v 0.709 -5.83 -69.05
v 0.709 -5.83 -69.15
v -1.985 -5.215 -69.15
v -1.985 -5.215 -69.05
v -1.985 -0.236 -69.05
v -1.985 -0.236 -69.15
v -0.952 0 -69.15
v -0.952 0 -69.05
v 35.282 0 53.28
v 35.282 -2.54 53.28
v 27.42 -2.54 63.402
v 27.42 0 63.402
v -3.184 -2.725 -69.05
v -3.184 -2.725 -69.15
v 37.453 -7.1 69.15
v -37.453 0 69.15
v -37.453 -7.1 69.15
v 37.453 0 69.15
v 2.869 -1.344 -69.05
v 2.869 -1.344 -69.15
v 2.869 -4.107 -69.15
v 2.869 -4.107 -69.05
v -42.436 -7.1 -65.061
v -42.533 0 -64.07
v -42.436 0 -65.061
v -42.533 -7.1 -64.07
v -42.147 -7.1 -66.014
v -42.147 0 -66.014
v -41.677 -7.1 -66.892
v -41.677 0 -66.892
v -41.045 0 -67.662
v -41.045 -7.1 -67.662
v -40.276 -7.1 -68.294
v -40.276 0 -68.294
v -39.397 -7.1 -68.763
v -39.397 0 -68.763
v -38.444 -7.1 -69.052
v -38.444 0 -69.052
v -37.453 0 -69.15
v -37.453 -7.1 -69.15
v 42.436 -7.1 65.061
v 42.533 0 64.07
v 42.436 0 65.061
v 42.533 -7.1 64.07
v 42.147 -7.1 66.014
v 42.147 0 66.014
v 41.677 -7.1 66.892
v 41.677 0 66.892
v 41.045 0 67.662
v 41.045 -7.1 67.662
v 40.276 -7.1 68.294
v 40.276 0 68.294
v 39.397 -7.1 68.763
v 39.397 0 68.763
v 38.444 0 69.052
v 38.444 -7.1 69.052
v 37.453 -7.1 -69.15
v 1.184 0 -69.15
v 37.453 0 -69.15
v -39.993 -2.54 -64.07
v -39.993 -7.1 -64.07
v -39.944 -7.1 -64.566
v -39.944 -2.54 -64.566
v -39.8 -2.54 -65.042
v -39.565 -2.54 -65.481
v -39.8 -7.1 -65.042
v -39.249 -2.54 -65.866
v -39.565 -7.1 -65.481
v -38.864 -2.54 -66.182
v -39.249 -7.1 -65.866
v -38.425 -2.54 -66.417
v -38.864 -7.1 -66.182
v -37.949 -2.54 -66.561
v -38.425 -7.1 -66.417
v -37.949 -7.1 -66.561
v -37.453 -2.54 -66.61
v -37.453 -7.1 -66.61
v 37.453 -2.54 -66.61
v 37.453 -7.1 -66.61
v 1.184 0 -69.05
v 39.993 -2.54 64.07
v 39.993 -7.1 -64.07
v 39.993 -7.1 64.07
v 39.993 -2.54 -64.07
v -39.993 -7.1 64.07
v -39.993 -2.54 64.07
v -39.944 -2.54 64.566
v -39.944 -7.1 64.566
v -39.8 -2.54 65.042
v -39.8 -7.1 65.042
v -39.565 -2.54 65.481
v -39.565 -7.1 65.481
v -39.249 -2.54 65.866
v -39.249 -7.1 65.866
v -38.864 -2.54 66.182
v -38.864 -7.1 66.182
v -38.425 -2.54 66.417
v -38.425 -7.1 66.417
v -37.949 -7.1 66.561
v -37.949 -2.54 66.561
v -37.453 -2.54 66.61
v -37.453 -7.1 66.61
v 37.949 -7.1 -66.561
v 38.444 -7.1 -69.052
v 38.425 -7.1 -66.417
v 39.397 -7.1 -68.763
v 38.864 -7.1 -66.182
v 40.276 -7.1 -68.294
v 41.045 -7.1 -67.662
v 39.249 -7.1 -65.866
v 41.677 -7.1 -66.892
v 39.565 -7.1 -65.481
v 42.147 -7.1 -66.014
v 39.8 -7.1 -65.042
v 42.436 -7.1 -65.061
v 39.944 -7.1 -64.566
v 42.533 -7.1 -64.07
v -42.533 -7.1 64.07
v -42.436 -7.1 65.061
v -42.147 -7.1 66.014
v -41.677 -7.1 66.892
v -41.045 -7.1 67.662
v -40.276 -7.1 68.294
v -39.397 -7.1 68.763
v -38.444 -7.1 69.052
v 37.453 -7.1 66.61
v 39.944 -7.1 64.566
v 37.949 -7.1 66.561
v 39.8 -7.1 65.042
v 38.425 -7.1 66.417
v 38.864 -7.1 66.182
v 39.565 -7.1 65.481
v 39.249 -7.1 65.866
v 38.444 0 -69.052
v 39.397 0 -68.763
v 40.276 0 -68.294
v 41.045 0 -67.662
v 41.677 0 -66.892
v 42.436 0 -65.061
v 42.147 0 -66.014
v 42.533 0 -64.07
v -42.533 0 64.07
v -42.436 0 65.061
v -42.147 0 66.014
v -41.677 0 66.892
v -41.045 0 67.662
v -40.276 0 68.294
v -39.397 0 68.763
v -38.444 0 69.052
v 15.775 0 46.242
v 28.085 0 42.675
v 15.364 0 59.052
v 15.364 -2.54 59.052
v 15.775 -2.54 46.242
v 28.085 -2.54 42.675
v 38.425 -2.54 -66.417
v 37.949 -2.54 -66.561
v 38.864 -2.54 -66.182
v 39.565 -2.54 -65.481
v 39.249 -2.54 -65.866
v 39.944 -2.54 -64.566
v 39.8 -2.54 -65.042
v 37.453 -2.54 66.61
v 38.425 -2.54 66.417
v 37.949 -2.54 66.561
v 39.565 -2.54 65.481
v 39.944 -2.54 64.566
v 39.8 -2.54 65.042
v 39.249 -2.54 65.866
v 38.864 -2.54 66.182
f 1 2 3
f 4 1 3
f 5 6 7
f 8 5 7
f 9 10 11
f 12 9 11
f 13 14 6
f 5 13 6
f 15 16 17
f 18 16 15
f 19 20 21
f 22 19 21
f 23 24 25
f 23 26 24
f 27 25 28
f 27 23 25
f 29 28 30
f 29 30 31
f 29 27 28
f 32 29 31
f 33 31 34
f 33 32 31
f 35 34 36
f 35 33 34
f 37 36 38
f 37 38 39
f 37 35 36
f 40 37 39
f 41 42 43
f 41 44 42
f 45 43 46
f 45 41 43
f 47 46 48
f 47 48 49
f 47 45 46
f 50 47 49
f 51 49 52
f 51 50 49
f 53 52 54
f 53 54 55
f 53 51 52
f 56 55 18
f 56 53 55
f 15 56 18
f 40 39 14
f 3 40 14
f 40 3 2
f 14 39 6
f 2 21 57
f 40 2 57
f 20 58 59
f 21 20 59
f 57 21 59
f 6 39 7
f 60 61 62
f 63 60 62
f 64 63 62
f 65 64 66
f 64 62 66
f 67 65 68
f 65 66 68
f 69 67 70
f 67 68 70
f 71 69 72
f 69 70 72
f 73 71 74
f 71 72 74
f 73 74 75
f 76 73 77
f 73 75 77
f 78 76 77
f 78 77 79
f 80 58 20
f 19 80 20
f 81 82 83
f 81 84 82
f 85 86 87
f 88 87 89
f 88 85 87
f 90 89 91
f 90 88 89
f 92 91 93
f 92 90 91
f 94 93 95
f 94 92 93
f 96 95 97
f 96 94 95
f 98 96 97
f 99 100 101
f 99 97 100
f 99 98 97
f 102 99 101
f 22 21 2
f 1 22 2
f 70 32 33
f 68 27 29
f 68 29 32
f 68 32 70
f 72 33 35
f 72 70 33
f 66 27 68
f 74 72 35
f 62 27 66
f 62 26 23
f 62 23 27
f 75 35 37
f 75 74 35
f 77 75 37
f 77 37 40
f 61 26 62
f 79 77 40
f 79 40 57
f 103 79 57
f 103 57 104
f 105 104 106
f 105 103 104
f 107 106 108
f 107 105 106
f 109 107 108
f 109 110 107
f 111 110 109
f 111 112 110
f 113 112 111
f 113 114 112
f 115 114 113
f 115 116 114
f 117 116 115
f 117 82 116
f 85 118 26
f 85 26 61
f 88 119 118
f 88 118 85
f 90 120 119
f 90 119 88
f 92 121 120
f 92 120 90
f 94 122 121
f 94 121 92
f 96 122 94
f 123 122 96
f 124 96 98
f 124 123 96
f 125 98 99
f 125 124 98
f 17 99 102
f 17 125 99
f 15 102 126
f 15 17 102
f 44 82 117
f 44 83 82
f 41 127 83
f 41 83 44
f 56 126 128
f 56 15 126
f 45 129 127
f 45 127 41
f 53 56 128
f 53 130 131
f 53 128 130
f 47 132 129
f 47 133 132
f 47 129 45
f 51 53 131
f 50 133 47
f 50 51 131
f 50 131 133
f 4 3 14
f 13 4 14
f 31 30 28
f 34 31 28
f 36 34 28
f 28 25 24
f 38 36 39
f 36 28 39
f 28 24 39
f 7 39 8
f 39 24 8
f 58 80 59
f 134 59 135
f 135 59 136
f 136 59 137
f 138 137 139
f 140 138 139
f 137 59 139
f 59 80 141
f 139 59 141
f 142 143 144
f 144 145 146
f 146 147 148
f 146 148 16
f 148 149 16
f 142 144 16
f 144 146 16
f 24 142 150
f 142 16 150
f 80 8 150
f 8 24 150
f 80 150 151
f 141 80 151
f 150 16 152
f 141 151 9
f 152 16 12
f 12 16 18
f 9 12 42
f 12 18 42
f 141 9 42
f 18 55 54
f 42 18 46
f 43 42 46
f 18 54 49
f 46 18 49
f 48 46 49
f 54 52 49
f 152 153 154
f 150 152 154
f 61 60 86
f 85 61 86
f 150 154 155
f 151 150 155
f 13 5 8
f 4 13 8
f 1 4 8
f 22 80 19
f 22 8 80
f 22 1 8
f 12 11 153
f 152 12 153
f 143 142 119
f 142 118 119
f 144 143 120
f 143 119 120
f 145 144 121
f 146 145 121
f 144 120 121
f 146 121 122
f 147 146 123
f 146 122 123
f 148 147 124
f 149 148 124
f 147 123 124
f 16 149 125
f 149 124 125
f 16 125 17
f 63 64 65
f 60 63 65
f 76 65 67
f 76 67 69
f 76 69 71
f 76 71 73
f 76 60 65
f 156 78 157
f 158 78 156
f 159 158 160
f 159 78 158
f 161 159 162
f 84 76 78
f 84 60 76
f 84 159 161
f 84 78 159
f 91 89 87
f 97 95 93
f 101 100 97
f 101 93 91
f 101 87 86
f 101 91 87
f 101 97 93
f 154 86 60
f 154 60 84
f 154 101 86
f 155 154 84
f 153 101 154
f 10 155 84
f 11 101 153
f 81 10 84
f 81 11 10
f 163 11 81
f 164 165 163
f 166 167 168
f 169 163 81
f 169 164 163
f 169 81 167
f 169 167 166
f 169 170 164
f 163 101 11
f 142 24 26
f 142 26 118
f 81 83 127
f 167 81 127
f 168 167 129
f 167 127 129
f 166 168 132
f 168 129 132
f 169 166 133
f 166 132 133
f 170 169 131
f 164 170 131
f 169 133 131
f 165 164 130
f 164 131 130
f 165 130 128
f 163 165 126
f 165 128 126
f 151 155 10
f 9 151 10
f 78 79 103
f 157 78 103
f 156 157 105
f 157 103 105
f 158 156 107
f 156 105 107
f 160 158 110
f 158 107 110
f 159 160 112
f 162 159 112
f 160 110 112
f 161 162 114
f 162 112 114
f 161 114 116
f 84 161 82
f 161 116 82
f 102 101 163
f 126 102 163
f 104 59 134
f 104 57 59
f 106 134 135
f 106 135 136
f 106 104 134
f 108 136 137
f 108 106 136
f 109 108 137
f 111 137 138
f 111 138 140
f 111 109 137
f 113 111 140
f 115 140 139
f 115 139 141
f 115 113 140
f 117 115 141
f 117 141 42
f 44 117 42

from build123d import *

# Parameters (mm, degrees)
F0_W     = 85.0665410506
F0_H     = 138.3
F1_DEPTH = 7.1
F2_R     = 5.08
F3_T     = -2.54
F5_DEPTH = 25
F8_DEPTH = 0.1


# Not quite as in the source:
# - a feature of the source that left no trace in its solid (it failed there, or was rolled back) is left out


with BuildPart() as f1:
    # F0 (on Front) → F1 (new body)
    with BuildSketch(Plane.XZ):
        Rectangle(F0_W, F0_H)
    extrude(amount=F1_DEPTH)

    # F2
    f2_edges = [f1.edges().sort_by_distance(p)[0] for p in [
        (42.533271, -3.55, -69.15),
        (-42.533271, -3.55, -69.15),
        (42.533271, -3.55, 69.15),
        (-42.533271, -3.55, 69.15),
    ]]
    fillet(f2_edges, radius=F2_R)

    # F3
    f3_openings = [f1.faces().sort_by_distance(p)[0] for p in [
        (0, -7.1, 0),
    ]]
    offset(amount=F3_T, openings=f3_openings)

    # F4 (on face) → F5 (cut)
    with BuildSketch(Plane.XZ.offset(2.54)):
        Polygon((15.775061698, 46.2421439753), (28.0853956244, 42.6747929635), (35.2822504398, 53.2802441743), (27.4198174015, 63.4021245005), (15.3637117341, 59.0523393613), align=None)
    extrude(amount=-F5_DEPTH, mode=Mode.SUBTRACT)

    # F7 (on face) → F8 (cut)
    with BuildSketch(Plane(origin=(0, 0, -69.15), x_dir=(1, 0, 0), z_dir=(0, 0, -1))):
        Polygon((2.8688537423, 1.343842895), (2.8688537423, 4.1069771897), (0.7085483604, 5.8297632436), (-1.9853083886, 5.2149080197), (-3.1841874281, 2.7254100423), (-1.9853083886, 0.235912065), (0.7085483604, -0.3789431589), align=None)
    extrude(amount=-F8_DEPTH, mode=Mode.SUBTRACT)


solid = f1.part
